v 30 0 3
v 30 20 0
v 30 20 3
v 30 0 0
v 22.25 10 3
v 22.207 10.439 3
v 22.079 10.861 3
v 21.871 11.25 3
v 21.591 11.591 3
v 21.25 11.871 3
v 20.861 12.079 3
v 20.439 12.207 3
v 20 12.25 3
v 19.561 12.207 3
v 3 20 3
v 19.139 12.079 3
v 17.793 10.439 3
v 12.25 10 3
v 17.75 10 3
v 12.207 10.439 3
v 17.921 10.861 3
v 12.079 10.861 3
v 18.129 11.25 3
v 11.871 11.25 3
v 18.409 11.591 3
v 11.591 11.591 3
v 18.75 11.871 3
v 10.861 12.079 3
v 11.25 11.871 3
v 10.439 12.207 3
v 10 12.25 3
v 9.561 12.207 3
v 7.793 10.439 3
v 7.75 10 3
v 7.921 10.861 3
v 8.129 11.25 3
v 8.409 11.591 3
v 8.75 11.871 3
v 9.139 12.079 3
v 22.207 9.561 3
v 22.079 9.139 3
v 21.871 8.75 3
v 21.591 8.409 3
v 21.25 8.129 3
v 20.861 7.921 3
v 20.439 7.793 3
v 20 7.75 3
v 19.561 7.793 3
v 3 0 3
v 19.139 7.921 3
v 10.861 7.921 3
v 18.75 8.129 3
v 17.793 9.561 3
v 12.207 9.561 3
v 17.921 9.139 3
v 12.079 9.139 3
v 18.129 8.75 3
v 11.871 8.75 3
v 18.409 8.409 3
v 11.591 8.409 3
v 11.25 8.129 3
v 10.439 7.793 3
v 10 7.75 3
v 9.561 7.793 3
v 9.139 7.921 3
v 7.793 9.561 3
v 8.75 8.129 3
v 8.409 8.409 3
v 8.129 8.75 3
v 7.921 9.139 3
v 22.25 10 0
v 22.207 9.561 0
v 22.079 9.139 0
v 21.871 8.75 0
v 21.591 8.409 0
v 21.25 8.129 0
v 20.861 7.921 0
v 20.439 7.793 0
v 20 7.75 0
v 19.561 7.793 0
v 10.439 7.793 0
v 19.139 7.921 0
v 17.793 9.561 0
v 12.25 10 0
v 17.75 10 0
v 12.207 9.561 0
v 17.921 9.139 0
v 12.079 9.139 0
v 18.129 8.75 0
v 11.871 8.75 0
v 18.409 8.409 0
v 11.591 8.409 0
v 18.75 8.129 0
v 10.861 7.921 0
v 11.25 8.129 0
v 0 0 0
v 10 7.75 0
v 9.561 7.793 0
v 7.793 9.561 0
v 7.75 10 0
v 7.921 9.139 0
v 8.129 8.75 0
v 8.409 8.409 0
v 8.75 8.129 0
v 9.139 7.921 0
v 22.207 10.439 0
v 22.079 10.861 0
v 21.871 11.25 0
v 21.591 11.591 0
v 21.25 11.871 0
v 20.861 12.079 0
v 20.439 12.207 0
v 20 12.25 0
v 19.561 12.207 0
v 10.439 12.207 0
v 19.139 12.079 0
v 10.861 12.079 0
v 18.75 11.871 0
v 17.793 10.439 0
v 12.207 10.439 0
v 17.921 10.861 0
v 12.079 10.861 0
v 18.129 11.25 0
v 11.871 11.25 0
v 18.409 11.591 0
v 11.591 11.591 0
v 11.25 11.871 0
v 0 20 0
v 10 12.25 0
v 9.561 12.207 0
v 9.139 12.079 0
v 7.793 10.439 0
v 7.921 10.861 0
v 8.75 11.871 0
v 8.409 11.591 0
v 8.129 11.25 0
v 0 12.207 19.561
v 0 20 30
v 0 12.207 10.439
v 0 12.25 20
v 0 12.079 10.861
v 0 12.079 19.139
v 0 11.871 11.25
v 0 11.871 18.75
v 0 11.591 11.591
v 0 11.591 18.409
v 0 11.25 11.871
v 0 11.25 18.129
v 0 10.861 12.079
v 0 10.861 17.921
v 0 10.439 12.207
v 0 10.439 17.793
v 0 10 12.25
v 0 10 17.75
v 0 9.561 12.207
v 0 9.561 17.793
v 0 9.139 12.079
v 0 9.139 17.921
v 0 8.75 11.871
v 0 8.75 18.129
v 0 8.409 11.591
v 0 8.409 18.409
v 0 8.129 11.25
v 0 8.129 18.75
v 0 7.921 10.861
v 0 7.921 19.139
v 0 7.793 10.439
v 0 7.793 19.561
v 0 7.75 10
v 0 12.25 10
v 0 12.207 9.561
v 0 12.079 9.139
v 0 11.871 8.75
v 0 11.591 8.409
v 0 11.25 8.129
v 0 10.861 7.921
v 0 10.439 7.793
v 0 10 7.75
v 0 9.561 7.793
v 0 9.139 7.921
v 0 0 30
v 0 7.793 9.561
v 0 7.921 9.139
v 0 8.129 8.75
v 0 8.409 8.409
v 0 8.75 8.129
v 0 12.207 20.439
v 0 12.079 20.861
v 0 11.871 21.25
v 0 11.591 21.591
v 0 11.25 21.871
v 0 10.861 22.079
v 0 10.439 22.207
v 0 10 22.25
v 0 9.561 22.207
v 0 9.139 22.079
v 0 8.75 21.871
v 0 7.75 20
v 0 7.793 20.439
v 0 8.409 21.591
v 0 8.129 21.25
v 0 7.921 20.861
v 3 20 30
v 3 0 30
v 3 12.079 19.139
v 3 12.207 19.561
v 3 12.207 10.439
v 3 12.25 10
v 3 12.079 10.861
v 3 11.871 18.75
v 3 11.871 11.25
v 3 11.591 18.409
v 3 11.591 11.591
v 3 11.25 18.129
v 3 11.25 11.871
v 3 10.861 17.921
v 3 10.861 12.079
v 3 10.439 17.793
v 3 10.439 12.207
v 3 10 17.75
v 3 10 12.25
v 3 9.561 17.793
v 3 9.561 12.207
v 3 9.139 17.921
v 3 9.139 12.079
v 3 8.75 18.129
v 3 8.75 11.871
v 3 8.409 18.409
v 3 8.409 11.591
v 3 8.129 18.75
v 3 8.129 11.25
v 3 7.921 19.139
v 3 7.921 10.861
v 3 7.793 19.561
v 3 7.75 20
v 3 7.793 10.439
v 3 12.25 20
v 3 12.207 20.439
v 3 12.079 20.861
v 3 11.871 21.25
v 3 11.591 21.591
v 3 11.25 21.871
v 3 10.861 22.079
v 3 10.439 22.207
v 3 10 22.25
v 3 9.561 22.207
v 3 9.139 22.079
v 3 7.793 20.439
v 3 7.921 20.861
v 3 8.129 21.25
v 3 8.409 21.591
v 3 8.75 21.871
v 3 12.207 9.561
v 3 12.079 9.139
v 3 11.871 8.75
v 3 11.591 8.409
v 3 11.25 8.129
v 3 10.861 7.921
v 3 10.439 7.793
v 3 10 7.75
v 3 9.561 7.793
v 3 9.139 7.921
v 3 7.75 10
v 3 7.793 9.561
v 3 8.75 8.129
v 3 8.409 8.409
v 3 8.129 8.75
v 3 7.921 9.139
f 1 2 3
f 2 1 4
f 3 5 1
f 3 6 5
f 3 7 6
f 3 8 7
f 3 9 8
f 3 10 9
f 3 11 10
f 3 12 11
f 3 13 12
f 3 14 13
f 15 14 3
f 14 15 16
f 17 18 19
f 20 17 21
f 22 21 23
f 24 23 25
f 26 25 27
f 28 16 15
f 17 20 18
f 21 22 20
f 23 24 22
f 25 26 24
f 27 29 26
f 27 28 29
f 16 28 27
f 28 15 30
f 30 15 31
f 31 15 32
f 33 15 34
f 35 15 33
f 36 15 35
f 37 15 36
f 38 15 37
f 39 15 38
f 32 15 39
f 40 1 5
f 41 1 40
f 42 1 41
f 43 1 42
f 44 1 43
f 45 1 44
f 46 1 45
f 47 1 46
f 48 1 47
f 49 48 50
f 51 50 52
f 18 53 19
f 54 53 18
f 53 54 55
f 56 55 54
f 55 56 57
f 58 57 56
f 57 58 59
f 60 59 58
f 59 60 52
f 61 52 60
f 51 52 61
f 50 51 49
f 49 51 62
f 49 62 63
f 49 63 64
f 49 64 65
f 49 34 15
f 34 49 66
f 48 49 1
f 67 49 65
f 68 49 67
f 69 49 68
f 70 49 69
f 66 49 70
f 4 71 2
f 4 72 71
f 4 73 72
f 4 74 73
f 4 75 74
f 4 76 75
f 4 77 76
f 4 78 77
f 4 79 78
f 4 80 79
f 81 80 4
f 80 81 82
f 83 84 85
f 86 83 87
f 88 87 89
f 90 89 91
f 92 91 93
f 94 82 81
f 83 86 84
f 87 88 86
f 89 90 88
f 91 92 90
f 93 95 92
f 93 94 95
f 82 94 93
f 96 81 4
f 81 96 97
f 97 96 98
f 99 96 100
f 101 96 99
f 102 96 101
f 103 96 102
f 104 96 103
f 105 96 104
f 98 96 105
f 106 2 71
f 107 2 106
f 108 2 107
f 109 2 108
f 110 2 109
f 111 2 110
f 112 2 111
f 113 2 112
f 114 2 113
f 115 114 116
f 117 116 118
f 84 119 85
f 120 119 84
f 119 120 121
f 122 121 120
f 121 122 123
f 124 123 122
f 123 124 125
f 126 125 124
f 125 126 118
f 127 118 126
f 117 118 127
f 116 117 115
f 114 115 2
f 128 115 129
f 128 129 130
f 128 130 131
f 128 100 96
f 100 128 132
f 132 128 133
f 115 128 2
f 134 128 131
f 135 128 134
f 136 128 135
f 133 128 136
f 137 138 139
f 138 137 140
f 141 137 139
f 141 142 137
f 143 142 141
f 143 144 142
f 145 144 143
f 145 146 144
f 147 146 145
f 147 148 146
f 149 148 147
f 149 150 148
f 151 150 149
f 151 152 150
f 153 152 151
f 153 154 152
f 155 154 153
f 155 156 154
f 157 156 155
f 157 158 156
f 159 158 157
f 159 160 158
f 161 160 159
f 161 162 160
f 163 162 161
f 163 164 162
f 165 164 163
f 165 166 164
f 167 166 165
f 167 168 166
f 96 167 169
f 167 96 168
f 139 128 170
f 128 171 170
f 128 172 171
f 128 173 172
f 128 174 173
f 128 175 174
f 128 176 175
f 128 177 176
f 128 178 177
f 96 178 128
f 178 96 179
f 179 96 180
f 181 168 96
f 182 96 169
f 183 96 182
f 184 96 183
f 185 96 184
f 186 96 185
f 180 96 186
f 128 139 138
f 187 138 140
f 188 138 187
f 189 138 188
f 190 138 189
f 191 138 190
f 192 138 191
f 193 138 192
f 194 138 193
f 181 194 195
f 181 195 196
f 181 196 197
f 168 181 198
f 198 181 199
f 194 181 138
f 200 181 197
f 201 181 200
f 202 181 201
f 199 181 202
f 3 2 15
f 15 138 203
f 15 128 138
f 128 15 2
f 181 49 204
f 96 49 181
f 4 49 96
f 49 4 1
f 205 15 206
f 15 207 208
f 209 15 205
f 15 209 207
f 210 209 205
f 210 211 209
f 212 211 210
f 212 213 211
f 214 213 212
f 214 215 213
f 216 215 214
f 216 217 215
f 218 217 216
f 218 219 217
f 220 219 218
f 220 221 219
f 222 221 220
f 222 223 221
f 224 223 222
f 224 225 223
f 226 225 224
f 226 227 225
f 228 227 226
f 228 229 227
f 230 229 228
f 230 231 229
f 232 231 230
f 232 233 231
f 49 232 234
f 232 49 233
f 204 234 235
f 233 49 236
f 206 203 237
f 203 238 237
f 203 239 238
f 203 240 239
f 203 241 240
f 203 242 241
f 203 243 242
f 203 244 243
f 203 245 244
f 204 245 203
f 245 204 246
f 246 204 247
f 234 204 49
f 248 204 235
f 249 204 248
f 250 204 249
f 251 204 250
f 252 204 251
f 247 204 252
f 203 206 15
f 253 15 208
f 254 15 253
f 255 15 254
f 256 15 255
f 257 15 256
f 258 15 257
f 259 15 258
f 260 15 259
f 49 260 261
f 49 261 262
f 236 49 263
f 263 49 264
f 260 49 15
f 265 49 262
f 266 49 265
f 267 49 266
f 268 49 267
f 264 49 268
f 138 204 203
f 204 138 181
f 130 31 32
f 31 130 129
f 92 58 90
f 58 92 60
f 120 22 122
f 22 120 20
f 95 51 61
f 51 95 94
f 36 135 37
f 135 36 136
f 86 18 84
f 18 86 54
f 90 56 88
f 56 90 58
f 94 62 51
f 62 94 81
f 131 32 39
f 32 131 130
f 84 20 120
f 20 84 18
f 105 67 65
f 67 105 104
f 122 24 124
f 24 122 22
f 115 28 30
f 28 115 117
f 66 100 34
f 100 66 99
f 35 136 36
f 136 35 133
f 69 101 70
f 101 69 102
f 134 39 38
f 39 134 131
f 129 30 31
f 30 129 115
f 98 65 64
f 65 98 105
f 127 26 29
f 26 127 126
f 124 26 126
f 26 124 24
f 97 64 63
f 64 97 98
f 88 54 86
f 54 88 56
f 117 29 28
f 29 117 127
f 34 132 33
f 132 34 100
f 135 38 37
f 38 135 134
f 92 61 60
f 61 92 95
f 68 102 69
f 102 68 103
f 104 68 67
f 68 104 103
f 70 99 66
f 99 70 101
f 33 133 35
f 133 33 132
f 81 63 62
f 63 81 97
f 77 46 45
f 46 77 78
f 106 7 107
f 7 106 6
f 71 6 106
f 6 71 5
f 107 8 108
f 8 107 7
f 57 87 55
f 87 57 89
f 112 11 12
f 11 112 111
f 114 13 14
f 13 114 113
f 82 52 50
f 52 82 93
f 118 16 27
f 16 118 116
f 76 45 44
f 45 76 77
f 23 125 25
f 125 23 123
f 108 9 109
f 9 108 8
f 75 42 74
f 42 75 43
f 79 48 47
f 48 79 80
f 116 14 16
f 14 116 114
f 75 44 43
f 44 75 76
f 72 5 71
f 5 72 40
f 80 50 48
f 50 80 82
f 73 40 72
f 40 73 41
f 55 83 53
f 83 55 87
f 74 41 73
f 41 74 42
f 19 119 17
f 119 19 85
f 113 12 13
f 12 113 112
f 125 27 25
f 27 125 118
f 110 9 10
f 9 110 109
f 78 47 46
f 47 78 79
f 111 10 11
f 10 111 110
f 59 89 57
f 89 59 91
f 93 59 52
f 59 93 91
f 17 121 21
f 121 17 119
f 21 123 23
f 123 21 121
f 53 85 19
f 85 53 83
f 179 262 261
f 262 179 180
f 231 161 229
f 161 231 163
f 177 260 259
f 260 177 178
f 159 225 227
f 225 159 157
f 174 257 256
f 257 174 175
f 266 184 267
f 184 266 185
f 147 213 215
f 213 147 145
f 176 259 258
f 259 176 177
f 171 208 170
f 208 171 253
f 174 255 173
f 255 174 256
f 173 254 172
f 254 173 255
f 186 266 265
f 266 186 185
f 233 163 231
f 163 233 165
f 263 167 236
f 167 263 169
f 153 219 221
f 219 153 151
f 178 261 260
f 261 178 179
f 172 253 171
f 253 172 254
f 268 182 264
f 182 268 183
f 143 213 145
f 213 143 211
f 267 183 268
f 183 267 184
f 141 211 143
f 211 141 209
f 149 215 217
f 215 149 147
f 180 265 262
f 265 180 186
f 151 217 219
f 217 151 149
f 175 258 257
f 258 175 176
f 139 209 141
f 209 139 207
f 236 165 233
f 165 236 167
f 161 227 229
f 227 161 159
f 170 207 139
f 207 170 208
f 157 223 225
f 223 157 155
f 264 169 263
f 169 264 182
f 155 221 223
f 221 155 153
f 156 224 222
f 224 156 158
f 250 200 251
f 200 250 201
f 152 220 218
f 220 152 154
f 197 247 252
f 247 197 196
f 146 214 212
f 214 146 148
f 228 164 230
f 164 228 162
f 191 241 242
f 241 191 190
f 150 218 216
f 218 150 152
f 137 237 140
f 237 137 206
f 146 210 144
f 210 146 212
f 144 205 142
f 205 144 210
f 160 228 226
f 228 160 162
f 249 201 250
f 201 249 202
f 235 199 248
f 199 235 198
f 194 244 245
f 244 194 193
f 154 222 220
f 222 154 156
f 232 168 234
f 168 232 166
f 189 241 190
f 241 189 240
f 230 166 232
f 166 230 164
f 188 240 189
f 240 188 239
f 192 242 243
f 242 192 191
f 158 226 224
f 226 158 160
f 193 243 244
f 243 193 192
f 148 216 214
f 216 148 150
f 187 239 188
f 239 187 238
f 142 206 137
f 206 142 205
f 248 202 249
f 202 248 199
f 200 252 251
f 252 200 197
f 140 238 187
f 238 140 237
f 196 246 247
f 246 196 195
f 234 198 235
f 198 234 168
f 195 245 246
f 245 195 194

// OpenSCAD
// Self-Balancing Cube — Corner Bracket
// Reinforces 90-degree joints in 2020 aluminum frame
// Print: PETG or ABS, 60% infill for strength

$fn = 32;

arm_l  = 30;
arm_w  = 20.0;
arm_t  = 3;
bolt_d = 4.5;   // M4 clearance

difference() {
    union() {
        // Arm 1
        cube([arm_l, arm_w, arm_t]);

        // Arm 2 (perpendicular)
        cube([arm_t, arm_w, arm_l]);
    }

    // Bolt holes arm 1
    for (x = [arm_l/3, 2*arm_l/3]) {
        translate([x, arm_w/2, -1])
            cylinder(h=arm_t + 2, d=bolt_d);
    }

    // Bolt holes arm 2
    for (z = [arm_l/3, 2*arm_l/3]) {
        translate([-1, arm_w/2, z])
            rotate([0, 90, 0])
                cylinder(h=arm_t + 2, d=bolt_d);
    }
}
